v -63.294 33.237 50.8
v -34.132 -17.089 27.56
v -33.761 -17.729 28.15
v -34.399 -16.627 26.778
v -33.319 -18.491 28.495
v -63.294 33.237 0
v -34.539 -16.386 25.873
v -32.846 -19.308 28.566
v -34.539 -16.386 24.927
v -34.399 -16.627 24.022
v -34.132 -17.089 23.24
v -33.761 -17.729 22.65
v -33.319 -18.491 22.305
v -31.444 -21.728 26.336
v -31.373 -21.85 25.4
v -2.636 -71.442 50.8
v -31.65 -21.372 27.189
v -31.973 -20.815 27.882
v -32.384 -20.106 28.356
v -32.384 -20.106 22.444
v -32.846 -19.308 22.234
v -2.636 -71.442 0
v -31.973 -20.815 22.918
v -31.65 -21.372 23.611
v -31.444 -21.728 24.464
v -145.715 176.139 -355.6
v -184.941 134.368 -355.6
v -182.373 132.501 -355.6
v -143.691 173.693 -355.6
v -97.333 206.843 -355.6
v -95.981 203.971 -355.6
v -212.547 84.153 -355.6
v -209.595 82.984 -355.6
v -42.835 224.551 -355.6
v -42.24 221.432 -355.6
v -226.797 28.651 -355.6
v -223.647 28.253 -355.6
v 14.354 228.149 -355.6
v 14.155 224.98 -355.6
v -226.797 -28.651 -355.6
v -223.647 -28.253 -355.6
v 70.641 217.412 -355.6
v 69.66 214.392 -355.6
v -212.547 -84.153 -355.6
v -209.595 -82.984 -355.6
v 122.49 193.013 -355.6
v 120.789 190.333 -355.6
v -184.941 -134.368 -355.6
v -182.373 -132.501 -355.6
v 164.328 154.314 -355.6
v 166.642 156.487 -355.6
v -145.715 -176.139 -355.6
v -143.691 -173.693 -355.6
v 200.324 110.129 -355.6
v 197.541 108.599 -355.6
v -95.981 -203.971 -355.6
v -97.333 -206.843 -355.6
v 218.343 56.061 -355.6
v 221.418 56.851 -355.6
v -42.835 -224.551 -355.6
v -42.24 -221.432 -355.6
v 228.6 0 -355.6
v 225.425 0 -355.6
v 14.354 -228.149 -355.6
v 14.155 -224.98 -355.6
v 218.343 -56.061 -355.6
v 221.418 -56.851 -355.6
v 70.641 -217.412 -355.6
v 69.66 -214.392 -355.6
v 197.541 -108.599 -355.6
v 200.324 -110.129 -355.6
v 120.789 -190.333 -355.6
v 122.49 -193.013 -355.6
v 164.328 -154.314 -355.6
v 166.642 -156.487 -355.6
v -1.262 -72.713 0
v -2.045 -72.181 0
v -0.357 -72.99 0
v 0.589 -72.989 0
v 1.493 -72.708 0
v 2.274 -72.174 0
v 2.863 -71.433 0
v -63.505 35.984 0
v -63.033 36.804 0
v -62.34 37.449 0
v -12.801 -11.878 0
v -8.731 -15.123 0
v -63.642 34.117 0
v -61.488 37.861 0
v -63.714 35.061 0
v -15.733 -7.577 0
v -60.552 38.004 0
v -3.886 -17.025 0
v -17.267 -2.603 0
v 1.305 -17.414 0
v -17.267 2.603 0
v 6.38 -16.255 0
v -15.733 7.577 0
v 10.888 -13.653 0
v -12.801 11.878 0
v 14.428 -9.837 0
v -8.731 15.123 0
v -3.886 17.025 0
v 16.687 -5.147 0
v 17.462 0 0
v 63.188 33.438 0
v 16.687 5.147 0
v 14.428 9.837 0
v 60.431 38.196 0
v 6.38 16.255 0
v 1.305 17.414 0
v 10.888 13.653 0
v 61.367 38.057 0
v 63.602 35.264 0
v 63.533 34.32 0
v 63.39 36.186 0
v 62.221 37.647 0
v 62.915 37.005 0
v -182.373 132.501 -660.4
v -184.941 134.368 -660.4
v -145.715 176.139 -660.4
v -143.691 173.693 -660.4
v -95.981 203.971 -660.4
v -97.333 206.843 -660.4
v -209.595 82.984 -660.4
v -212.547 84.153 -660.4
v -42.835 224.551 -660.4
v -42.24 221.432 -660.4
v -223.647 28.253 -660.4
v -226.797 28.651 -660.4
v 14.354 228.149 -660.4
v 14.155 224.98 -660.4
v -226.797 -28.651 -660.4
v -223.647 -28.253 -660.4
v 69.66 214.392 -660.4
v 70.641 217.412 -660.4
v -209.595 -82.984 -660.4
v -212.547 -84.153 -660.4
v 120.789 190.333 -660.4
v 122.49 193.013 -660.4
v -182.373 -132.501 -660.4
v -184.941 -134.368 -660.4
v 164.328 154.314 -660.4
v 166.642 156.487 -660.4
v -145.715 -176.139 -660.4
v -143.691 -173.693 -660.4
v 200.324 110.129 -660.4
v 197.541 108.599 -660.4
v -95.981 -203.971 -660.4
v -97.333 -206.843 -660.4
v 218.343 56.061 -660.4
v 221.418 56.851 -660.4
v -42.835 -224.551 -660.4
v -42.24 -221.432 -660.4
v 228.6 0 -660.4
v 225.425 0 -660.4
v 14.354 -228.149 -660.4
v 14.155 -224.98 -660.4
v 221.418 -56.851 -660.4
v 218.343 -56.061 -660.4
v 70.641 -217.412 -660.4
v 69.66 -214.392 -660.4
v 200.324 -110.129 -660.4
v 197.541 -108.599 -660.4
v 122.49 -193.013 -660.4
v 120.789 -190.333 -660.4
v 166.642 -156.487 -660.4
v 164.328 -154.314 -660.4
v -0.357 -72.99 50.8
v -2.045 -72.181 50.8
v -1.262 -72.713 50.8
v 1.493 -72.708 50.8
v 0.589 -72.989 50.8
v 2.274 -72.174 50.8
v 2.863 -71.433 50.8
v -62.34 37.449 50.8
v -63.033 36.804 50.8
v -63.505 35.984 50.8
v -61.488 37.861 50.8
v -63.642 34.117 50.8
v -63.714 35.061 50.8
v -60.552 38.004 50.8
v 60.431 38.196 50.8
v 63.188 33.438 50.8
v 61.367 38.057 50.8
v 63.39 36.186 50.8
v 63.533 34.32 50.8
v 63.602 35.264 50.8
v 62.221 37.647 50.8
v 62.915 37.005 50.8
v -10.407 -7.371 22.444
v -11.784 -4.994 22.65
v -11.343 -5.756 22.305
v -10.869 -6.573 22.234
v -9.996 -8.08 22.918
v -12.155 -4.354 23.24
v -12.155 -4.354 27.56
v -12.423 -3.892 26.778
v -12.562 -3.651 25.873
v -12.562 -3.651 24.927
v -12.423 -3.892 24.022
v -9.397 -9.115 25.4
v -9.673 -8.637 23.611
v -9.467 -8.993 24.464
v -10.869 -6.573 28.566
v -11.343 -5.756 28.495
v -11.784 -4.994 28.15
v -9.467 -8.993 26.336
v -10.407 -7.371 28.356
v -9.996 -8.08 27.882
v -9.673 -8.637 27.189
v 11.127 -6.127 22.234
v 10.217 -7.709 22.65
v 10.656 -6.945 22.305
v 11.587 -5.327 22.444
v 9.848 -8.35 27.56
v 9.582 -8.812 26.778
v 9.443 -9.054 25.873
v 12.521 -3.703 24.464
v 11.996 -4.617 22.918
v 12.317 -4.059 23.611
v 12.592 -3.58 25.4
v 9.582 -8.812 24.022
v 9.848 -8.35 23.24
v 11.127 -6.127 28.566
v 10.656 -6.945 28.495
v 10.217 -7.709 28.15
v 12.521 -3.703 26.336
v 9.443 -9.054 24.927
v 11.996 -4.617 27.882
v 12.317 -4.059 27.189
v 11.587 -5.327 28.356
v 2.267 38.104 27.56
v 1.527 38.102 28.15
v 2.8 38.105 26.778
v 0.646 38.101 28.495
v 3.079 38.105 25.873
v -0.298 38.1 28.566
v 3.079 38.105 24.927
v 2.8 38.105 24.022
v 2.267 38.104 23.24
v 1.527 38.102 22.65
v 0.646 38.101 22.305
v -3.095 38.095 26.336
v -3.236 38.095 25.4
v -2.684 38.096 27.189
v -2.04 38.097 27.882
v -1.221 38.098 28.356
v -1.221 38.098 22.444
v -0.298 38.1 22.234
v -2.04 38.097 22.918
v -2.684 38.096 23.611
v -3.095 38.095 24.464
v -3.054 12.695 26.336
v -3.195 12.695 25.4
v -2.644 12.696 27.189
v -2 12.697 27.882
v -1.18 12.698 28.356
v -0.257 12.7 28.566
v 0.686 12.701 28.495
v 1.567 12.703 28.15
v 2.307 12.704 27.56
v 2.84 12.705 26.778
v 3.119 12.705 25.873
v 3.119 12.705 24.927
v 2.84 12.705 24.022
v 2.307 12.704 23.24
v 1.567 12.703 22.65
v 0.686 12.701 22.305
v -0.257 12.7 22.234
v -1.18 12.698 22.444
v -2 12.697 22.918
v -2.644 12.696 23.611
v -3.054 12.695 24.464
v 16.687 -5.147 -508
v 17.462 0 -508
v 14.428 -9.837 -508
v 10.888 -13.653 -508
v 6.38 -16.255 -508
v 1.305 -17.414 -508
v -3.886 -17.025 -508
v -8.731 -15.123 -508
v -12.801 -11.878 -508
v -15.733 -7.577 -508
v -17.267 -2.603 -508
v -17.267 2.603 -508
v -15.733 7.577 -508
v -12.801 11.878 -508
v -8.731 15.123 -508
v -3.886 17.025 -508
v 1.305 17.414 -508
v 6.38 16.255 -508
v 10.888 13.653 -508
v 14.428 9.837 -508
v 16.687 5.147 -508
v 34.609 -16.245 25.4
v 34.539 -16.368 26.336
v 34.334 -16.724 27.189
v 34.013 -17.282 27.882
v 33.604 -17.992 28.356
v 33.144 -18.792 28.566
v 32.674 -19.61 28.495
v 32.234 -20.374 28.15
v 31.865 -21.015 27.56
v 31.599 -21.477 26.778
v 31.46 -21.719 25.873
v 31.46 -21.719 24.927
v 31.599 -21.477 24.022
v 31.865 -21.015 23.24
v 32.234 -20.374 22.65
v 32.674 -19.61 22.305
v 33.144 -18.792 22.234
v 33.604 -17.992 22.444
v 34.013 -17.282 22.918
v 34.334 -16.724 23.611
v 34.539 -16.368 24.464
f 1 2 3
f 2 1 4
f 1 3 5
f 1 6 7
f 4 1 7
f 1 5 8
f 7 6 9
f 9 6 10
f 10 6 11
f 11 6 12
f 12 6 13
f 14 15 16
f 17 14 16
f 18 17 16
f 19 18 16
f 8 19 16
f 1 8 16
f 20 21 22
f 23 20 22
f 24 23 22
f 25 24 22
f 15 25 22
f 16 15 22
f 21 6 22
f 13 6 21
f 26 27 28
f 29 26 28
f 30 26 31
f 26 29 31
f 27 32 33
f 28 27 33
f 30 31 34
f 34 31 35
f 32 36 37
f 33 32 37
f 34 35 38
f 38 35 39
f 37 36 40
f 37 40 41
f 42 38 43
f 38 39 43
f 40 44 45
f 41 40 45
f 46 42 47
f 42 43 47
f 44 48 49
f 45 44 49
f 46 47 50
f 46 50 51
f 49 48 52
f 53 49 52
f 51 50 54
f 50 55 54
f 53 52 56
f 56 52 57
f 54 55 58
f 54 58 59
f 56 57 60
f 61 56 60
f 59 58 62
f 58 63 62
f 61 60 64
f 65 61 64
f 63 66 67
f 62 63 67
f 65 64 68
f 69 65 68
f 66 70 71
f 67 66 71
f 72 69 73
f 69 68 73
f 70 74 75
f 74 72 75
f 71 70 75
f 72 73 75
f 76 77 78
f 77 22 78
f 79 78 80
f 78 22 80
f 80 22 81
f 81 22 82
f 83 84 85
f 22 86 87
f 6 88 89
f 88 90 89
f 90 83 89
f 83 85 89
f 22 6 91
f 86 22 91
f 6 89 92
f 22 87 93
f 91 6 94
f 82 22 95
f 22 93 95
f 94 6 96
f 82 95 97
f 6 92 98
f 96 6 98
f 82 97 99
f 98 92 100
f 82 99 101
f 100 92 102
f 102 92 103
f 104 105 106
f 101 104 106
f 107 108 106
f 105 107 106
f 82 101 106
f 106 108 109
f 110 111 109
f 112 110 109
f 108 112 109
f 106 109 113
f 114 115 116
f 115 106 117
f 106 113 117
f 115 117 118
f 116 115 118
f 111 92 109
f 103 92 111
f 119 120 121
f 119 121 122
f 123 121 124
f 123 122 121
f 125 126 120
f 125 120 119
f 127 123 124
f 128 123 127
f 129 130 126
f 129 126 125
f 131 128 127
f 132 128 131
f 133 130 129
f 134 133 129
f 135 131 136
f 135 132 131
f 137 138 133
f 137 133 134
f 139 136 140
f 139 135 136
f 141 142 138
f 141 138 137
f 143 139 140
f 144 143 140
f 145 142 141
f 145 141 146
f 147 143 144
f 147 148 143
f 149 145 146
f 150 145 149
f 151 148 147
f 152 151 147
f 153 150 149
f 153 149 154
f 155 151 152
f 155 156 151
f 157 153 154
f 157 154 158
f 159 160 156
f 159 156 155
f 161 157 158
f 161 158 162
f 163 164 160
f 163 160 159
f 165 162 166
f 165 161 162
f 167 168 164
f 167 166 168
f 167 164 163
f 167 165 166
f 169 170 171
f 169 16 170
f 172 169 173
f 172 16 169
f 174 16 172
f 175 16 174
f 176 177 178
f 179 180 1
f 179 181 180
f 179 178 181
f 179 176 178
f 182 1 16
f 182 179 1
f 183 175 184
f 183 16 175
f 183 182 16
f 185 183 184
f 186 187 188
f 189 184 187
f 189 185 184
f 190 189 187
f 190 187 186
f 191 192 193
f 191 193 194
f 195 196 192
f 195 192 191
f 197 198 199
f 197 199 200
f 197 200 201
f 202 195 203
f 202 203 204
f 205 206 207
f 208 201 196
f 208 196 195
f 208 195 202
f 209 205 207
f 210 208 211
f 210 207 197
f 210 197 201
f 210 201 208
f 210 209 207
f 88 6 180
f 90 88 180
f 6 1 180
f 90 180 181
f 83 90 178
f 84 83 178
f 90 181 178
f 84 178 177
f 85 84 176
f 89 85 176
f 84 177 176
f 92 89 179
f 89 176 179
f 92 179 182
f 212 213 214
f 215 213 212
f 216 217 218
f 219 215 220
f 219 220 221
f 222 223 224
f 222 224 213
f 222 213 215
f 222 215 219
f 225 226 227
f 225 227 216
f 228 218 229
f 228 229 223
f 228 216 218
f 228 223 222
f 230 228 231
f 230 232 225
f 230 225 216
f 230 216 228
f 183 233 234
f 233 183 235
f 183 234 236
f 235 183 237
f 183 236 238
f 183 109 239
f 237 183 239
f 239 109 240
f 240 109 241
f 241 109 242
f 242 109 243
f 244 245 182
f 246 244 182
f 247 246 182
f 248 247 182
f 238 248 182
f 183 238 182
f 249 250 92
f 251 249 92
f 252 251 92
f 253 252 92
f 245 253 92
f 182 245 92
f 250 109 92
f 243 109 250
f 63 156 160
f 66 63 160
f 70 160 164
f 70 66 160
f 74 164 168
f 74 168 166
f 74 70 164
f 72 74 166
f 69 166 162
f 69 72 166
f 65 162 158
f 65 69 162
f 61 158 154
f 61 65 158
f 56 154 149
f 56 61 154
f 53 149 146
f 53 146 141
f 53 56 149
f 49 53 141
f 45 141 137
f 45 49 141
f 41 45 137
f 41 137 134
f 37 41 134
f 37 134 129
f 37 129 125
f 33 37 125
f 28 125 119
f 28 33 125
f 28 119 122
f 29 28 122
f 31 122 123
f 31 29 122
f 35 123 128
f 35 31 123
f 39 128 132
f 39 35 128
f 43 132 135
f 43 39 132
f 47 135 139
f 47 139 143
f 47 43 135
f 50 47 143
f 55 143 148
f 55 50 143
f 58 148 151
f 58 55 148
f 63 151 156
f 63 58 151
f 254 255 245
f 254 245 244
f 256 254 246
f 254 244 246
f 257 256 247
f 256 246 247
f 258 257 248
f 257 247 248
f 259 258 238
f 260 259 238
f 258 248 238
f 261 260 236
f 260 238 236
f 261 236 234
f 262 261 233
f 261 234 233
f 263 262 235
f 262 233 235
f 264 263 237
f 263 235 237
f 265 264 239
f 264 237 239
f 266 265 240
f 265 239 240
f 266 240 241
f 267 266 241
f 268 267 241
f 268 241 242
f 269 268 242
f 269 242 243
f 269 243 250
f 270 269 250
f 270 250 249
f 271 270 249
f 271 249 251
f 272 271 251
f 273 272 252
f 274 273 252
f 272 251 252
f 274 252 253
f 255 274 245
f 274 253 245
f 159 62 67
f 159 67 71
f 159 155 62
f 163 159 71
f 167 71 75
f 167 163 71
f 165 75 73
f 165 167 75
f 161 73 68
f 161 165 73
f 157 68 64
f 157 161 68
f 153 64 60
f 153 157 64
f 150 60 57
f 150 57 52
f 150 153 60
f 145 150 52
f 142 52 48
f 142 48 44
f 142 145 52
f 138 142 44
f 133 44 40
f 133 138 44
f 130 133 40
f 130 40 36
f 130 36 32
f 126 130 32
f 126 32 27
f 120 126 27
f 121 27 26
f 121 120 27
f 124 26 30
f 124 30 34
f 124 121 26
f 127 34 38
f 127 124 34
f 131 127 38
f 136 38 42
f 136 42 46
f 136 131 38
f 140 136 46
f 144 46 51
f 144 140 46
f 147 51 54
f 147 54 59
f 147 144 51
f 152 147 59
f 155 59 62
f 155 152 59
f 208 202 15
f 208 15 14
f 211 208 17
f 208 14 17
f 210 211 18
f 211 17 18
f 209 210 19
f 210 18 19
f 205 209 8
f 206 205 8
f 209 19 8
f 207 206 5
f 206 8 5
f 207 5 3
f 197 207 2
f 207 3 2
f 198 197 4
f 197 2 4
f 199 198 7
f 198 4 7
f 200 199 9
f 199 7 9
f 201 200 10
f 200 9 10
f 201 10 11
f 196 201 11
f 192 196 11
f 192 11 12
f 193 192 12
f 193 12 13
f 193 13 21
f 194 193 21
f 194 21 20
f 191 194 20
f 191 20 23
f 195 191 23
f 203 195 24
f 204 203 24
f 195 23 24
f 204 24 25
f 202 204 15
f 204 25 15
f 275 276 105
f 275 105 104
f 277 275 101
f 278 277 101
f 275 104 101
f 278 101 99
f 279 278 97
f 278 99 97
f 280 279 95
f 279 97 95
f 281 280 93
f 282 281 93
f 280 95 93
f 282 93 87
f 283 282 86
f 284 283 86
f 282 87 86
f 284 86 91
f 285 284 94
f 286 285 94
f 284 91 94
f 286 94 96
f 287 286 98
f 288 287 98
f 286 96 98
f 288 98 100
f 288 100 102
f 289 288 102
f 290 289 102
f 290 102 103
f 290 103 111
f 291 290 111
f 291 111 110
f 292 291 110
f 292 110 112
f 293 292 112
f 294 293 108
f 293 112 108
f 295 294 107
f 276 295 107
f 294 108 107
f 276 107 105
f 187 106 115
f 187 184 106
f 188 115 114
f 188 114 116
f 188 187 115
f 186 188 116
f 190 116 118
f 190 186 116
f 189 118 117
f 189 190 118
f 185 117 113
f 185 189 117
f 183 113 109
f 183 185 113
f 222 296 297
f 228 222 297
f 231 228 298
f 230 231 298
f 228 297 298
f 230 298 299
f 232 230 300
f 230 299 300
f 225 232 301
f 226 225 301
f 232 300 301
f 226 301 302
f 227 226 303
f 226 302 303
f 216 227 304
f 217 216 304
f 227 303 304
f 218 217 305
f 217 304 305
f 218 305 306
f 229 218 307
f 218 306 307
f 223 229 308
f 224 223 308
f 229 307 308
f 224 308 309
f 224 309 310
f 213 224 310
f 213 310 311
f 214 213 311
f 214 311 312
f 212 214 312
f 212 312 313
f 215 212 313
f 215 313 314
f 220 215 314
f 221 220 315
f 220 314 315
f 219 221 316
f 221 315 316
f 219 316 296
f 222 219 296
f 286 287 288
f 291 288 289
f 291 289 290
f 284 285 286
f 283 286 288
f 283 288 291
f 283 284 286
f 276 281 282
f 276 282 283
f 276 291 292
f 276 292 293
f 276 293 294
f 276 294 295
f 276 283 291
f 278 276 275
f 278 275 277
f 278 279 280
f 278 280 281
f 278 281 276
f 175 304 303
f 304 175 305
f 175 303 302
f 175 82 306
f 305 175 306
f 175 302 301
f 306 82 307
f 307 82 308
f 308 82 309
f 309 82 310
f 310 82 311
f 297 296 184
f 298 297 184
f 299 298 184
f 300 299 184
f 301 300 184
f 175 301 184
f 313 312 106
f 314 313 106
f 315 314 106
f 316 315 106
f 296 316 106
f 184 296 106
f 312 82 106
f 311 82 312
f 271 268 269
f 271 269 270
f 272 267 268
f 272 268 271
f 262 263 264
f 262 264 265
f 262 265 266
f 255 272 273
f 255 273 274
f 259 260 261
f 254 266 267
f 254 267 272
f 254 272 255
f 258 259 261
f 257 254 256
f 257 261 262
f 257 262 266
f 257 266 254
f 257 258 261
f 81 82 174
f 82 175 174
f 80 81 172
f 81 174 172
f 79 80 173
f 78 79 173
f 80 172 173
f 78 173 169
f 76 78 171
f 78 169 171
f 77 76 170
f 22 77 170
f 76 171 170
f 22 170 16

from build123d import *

# Parameters (mm, degrees)
F1_DEPTH  = 50.8
F2_R      = 3.175
F3_DEPTH  = 25.4
F5_R      = 3.175
F6_DEPTH  = 25.4
F4_R      = 3.175
F7_DEPTH  = 25.4
F8_R      = 17.4625
F9_DEPTH  = 508
F10_R     = 228.6
F10_R_2   = 225.425
F11_DEPTH = 152.4
F12_R     = 3.175


with BuildPart() as f1:
    # F0 (on Top) → F1 (new body)
    with BuildSketch(Plane.XY):
        Polygon((0.1212541357, -76.1999035264), (65.930425152, 38.204960925), (-66.0516792876, 37.9949426014), align=None)
    extrude(amount=F1_DEPTH)

    # F2 (on face) → F3 (cut)
    with BuildSketch(Plane(origin=(33.0258396438, -18.9974713007, 0), x_dir=(0.498621294, 0.8668199382, 0), z_dir=(0.8668199382, -0.498621294, 0))):
        with Locations((0, 25.4)):
            Circle(F2_R)
    extrude(amount=-F3_DEPTH, mode=Mode.SUBTRACT)

    # F5 (on face) → F6 (cut)
    with BuildSketch(Plane(origin=(-32.965212576, -19.1024804625, 0), x_dir=(0.50137744, -0.8652286765, 0), z_dir=(-0.8652286765, -0.50137744, 0))):
        with Locations((0, 25.4)):
            Circle(F5_R)
    extrude(amount=-F6_DEPTH, mode=Mode.SUBTRACT)

    # F4 (on face) → F7 (cut)
    with BuildSketch(Plane(origin=(-0.0606270678, 38.0999517632, 0), x_dir=(-0.9999987339, -0.0015912616, 0), z_dir=(-0.0015912616, 0.9999987339, 0))):
        with Locations((0, 25.4)):
            Circle(F4_R)
    extrude(amount=-F7_DEPTH, mode=Mode.SUBTRACT)

    # F8 (on face) → F9 (join)
    with BuildSketch(Plane(origin=(0, 0, 0), x_dir=(1, 0, 0), z_dir=(0, 0, -1))):
        Circle(F8_R)
    extrude(amount=F9_DEPTH)

    # F12
    f12_edges = [f1.edges().sort_by_distance(p)[0] for p in [
        (65.930425, 38.204961, 25.4),
        (0.121254, -76.199904, 25.4),
        (-66.051679, 37.994943, 25.4),
    ]]
    fillet(f12_edges, radius=F12_R)


with BuildPart() as f11:
    # F10 (on face) → F11 (new body, symmetric)
    with BuildSketch(Plane(origin=(0, 0, -508), x_dir=(1, 0, 0), z_dir=(0, 0, -1))):
        Circle(F10_R)
        Circle(F10_R_2, mode=Mode.SUBTRACT)
    extrude(amount=F11_DEPTH, both=True)


solid = Compound([f1.part, f11.part])
